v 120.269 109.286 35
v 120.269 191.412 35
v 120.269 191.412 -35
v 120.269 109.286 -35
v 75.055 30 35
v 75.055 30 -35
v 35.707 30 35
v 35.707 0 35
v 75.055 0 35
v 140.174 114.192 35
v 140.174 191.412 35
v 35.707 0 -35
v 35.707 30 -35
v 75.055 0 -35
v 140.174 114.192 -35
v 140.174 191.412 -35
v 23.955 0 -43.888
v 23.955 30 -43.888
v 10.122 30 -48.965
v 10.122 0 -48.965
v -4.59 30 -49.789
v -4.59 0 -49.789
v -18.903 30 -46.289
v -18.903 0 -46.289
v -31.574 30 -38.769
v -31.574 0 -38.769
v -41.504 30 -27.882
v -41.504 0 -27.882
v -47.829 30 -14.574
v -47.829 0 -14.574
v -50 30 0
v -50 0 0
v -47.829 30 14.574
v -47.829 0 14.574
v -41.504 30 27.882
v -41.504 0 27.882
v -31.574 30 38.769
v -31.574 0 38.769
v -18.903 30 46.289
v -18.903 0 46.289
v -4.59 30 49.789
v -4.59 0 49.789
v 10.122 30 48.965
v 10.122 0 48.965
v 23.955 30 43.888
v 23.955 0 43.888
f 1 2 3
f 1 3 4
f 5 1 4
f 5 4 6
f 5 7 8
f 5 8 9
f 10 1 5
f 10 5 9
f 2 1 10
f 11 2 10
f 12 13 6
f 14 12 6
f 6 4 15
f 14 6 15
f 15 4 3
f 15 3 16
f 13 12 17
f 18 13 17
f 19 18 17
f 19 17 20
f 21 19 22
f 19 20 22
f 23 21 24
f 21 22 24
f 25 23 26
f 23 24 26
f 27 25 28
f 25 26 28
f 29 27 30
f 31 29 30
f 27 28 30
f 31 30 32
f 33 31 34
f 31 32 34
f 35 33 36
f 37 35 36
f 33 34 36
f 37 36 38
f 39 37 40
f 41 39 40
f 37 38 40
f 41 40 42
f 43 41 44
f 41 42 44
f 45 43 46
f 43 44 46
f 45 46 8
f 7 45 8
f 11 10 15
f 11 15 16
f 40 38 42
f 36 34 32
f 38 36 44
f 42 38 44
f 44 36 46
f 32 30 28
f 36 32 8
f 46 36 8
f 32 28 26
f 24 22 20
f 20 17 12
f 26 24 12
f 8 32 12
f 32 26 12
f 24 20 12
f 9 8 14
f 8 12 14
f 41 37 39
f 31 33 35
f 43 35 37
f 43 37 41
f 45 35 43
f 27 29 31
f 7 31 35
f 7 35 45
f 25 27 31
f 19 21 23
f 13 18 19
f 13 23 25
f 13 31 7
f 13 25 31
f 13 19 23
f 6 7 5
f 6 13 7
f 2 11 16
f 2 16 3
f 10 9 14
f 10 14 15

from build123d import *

# Parameters (mm, degrees)
EXTRUDE_1_DEPTH = 30
EXTRUDE_2_DEPTH = 70


with BuildPart() as part:
    # 草图1 → 凸台-拉伸1 (new body)
    with BuildSketch(Plane(origin=(0, 0, 0), x_dir=(1, 0, 0), z_dir=(0, 1, 0))):
        with BuildLine():
            Line((75.055476805, 35), (35.707142143, 35))
            ThreePointArc((35.707142143, 35), (46.289075964, 18.902948088), (50, 0))
            ThreePointArc((50, 0), (46.289075964, -18.902948088), (35.707142143, -35))
            Line((35.707142143, -35), (75.055476805, -35))
            Line((75.055476805, -35), (75.055476805, 35))
        make_face()
        with BuildLine():
            Line((0.055476805, -35), (0.055476805, 35))
            Line((0.055476805, 35), (35.707142143, 35))
            ThreePointArc((35.707142143, 35), (-50, 0), (35.707142143, -35))
            Line((35.707142143, -35), (0.055476805, -35))
        make_face()
        with BuildLine():
            Line((35.707142143, 35), (0.055476805, 35))
            Line((0.055476805, 35), (0.055476805, -35))
            Line((0.055476805, -35), (35.707142143, -35))
            ThreePointArc((35.707142143, -35), (46.289075964, -18.902948088), (50, 0))
            ThreePointArc((50, 0), (46.289075964, 18.902948088), (35.707142143, 35))
        make_face()
    extrude(amount=EXTRUDE_1_DEPTH)

    # 草图2 → 凸台-拉伸2 (add)
    with BuildSketch(Plane.XY.offset(35)):
        Polygon((75.055476805, 0), (140.174133177, 114.192122372), (140.174133177, 191.411564081), (120.26890055, 191.411564081), (120.26890055, 109.286292207), (75.055476805, 30), align=None)
    extrude(amount=-EXTRUDE_2_DEPTH)


solid = part.part
